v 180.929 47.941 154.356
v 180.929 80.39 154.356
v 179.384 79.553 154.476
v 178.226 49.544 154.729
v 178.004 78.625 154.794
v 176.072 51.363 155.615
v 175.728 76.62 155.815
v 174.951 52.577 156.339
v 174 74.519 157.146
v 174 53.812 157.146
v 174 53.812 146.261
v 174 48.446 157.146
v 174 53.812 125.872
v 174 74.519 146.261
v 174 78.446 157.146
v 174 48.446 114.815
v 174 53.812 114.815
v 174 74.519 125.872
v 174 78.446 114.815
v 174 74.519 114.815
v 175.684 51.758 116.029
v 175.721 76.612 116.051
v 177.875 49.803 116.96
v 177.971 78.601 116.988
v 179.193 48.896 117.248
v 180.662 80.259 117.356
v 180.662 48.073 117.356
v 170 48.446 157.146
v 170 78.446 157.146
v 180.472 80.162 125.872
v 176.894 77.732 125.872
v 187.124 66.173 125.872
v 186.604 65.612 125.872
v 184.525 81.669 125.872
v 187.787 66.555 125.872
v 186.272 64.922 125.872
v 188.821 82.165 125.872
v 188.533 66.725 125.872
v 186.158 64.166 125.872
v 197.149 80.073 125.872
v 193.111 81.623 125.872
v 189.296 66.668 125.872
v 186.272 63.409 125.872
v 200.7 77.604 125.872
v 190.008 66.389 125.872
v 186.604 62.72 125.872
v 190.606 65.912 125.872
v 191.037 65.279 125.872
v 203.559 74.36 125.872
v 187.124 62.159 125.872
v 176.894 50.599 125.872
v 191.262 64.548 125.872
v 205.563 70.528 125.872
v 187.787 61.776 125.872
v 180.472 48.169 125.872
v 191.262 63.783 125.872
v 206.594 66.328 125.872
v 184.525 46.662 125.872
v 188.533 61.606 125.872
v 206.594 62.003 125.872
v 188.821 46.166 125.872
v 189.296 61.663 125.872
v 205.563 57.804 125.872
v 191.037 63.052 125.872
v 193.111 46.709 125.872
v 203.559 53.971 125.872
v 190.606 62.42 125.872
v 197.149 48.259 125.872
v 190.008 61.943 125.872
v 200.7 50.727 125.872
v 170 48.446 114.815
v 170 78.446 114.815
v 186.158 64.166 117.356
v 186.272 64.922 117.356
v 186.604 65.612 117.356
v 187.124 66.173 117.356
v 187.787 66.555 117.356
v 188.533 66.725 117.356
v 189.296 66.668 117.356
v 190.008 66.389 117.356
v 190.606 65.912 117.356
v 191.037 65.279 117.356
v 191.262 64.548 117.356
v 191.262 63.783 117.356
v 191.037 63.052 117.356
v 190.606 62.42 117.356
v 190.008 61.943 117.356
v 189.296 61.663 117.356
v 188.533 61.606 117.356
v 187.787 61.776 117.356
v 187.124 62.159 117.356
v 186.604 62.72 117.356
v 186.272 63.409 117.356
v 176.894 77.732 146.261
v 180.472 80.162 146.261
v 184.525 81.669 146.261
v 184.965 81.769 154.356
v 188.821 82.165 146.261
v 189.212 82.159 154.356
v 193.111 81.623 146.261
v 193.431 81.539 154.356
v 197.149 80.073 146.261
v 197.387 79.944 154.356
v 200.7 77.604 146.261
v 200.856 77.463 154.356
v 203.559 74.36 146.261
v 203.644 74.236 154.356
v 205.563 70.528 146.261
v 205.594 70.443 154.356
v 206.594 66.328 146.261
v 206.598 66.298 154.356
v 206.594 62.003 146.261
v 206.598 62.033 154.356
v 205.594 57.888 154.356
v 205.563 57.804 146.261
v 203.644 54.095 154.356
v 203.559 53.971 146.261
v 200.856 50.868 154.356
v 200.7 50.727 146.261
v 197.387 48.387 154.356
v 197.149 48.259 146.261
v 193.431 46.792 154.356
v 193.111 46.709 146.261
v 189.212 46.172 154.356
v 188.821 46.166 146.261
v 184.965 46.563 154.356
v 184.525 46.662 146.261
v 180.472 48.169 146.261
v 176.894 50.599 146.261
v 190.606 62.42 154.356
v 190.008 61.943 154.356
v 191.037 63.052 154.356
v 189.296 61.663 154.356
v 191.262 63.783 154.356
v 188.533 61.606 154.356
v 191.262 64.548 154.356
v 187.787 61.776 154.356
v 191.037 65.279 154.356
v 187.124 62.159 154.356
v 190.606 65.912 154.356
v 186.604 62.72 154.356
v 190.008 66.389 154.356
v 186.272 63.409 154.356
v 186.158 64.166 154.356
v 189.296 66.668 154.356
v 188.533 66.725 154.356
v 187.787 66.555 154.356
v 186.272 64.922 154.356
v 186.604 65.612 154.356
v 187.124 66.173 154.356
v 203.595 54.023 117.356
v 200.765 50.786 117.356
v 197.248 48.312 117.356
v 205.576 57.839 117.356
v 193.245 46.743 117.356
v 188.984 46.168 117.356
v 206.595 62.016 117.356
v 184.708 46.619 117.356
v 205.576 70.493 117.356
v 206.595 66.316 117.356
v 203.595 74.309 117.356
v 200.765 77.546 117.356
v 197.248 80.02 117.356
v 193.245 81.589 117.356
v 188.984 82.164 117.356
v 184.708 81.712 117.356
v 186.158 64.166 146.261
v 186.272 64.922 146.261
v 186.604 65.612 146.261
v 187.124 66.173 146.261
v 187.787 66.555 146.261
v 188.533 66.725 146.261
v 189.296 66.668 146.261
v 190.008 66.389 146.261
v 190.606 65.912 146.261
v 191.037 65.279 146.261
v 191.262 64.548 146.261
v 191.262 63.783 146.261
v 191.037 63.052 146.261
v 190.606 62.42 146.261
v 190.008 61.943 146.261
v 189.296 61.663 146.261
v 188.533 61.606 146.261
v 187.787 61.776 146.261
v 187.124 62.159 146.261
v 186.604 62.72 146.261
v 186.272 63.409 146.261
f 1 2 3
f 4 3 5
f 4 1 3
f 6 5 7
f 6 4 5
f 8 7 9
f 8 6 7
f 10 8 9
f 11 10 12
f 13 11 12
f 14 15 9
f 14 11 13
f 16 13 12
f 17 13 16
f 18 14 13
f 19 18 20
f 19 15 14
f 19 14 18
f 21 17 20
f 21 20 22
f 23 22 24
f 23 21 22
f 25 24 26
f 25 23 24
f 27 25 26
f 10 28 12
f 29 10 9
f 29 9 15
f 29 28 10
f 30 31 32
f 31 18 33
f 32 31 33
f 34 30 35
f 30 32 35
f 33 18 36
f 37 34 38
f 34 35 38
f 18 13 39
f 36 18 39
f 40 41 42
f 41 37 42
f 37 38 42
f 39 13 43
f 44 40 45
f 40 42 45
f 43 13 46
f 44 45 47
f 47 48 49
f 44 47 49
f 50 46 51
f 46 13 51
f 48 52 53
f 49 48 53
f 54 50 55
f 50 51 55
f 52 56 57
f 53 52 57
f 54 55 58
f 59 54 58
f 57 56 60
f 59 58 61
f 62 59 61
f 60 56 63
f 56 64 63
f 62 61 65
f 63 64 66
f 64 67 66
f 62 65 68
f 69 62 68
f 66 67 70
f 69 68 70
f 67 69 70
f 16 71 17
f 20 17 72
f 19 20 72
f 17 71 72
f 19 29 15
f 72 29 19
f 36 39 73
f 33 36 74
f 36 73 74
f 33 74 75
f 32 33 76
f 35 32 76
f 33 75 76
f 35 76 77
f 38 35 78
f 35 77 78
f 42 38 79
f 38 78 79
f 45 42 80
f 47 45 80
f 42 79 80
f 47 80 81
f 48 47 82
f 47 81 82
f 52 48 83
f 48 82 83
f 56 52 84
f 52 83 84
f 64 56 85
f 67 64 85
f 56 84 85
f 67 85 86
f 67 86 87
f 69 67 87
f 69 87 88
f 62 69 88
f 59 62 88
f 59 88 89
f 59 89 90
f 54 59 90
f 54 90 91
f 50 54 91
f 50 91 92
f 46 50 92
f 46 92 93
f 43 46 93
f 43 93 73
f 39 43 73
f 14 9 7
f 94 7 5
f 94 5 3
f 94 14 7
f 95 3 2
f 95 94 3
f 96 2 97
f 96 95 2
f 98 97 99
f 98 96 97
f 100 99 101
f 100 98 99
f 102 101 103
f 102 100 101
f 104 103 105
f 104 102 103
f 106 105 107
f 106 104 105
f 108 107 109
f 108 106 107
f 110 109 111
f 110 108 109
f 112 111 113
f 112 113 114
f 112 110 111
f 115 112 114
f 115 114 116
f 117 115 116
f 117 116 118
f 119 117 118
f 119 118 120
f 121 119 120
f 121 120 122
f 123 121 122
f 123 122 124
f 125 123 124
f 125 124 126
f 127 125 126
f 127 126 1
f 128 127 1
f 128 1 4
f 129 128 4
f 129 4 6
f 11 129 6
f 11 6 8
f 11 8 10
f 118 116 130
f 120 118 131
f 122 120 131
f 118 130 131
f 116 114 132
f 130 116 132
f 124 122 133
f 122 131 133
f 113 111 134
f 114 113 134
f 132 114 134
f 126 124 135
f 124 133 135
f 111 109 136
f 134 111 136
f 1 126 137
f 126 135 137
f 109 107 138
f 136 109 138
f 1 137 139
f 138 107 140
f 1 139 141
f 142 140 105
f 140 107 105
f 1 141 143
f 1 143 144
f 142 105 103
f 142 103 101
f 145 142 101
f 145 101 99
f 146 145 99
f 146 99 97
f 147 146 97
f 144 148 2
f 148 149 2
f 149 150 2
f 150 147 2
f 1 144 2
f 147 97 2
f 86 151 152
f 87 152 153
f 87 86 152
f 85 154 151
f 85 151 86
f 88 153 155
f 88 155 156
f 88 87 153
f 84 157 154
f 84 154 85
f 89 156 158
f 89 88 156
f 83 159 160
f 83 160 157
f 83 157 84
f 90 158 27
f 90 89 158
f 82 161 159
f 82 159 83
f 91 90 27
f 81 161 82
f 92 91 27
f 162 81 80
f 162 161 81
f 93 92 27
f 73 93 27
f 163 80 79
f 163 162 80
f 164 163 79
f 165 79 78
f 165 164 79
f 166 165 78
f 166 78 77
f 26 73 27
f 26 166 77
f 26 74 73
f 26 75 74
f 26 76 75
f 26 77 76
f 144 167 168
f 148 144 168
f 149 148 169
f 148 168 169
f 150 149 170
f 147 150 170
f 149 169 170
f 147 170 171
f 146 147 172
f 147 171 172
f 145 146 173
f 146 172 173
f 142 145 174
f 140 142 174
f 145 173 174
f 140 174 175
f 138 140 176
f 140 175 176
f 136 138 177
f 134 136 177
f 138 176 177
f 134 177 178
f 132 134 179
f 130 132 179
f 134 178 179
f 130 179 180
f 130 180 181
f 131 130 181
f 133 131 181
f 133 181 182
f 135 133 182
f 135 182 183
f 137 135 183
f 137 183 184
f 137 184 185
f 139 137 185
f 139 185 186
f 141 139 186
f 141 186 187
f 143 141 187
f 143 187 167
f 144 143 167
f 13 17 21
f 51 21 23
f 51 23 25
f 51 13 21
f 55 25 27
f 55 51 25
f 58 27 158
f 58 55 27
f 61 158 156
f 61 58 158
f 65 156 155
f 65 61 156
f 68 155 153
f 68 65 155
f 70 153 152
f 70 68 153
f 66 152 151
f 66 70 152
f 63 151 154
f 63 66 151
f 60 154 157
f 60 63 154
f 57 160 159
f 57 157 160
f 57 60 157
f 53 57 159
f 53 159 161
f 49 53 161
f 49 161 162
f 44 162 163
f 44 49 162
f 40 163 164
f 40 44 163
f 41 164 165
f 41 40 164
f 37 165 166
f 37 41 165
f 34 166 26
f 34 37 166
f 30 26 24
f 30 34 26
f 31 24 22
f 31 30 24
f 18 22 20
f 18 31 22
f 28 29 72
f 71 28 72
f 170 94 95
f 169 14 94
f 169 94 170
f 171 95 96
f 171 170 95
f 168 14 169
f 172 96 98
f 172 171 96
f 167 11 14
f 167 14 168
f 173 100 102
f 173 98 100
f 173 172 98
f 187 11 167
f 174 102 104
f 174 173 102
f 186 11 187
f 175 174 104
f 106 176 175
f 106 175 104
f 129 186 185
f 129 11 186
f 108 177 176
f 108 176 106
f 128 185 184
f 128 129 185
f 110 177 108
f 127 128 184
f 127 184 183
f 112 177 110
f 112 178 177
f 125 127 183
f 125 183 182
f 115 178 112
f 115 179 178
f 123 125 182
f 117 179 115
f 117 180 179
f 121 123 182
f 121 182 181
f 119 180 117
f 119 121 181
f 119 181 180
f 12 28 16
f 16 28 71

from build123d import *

# Parameters (mm, degrees)
BOSS_EXTRUDE1_DEPTH      = 9
BOSS_EXTRUDE1_DEPTH_BACK = 28
SKETCH1_R                = 18
SKETCH2_W                = 50.00806526
SKETCH2_H                = 20.388963247
CUT_EXTRUDE1_DEPTH       = 137
SKETCH6_R                = 2.56681782
CUT_EXTRUDE2_DEPTH       = 40
BOSS_EXTRUDE2_START      = 170
SKETCH7_W                = 42.331288986
SKETCH7_H                = 30
BOSS_EXTRUDE2_DEPTH      = 4
FILLET1_R                = 10


with BuildPart() as part:
    # Sketch1 → Boss-Extrude1 (new, two sides: drawn at the far end of the back side and taken through both)
    with BuildSketch(Plane(origin=(0, 0, 126.356389087), x_dir=(-1, 0, 0), z_dir=(0, 0, -1)).offset(-BOSS_EXTRUDE1_DEPTH_BACK)):
        with Locations((-188.724341924, 64.165727937)):
            Circle(SKETCH1_R)
    extrude(amount=BOSS_EXTRUDE1_DEPTH + BOSS_EXTRUDE1_DEPTH_BACK)

    # Sketch2 → Cut-Extrude1 (cut)
    with BuildSketch(Plane(origin=(-6.948170377, -29.446447031, 0), x_dir=(0.99748757373397, -0.07084165615171512, 3.115559675779194e-15), z_dir=(0.07084165615171512, 0.99748757373397, 0))):
        with Locations((192.53019978, -136.066593827)):
            Rectangle(SKETCH2_W, SKETCH2_H)
    extrude(amount=CUT_EXTRUDE1_DEPTH, mode=Mode.SUBTRACT)


with BuildPart() as cut_extrude1_piece_1:
    # of the separate pieces the step leaves, piece 1, a body of its own (cut_extrude1_pieces)
    add(part.part.solids().sort_by_distance((170.724341924, 64.165727937, 125.872112203))[0])


with BuildPart() as cut_extrude1_piece_2:
    # of the separate pieces the step leaves, piece 2, a body of its own (cut_extrude1_pieces)
    add(part.part.solids().sort_by_distance((170.724341924, 64.165727937, 146.26107545))[0])


with BuildPart() as cut_extrude2_tool:
    # Sketch6 → Cut-Extrude2 (new body)
    with BuildSketch(Plane(origin=(0, 0, 117.356389087), x_dir=(-1, 0, 0), z_dir=(0, 0, -1))):
        with Locations((-188.724341924, 64.165727937)):
            Circle(SKETCH6_R)
    extrude(amount=-CUT_EXTRUDE2_DEPTH)


with BuildPart() as cut_extrude1_piece_1_1:
    add(cut_extrude1_piece_1.part)

    # Cut-Extrude2: cut by cut_extrude2_tool
    add(cut_extrude2_tool.part, mode=Mode.SUBTRACT)



with BuildPart() as cut_extrude1_piece_2_1:
    add(cut_extrude1_piece_2.part)

    # Cut-Extrude2: cut by cut_extrude2_tool
    add(cut_extrude2_tool.part, mode=Mode.SUBTRACT)


with BuildPart() as cut_extrude1_piece_1_2:
    add(cut_extrude1_piece_1_1.part)

    add(cut_extrude1_piece_2_1.part)  # Boss-Extrude2 merges Cut-Extrude1 piece 2
    # Sketch7 → Boss-Extrude2 (add)
    with BuildSketch(Plane(origin=(0, 0, 0), x_dir=(0, 0, -1), z_dir=(1, 0, 0)).offset(BOSS_EXTRUDE2_START)):
        with Locations((-135.980164786, 63.44621419)):
            Rectangle(SKETCH7_W, SKETCH7_H)
    extrude(amount=BOSS_EXTRUDE2_DEPTH)

    # Fillet1
    # the kernel refuses this fillet: 10 mm, written as the material it adds along each edge
    with BuildSketch(Plane(origin=(174, 37.158405517, 117.356389087), x_dir=(0, 0, -1), z_dir=(0, 1, 0))) as fillet1_piece_1_section:
        with BuildLine():
            CenterArc((10, -6.66155229), FILLET1_R, 138.228987443, 41.771012557)
            Line((0, -6.66155229), (-0.2, -6.66155229))
            Line((-0.2, -6.66155229), (-0.2, 0))
            Line((-0.2, 0), (0, 0.2))
            ThreePointArc((0, 0.2), (1.270934397, 0.2), (2.39270617, 0.133231046))
            Line((2.39270617, 0.133231046), (2.541868794, 0))
        make_face()
    fillet1_piece_1 = extrude(amount=54.01464484, mode=Mode.PRIVATE)
    fillet1_piece_1 = fillet1_piece_1 & Plane(origin=(188.724341924, 64.165727937, 117.454219773), x_dir=(-1, 0, 0), z_dir=(0, 0, 1)) * Cylinder(18, 135, mode=Mode.PRIVATE)
    add(fillet1_piece_1)
    with BuildSketch(Plane(origin=(174, 36.49041805, 154.356389087), x_dir=(0, 0, 1), z_dir=(0, 1, 0))) as fillet1_piece_2_section:
        with BuildLine():
            CenterArc((10, 6.928747277), FILLET1_R, 180, 43.858101489)
            Line((0, 6.928747277), (-0.2, 6.928747277))
            Line((-0.2, 6.928747277), (-0.2, 0))
            Line((-0.2, 0), (0, -0.2))
            ThreePointArc((0, -0.2), (1.394710096, -0.2), (2.645208596, -0.138574946))
            Line((2.645208596, -0.138574946), (2.789420192, 0))
        make_face()
    fillet1_piece_2 = extrude(amount=55.350619773, mode=Mode.PRIVATE)
    fillet1_piece_2 = fillet1_piece_2 & Plane(origin=(188.724341924, 64.165727937, 154.260633817), x_dir=(-1, 0, 0), z_dir=(0, 0, -1)) * Cylinder(18, 139, mode=Mode.PRIVATE)
    add(fillet1_piece_2)


solid = cut_extrude1_piece_1_2.part
